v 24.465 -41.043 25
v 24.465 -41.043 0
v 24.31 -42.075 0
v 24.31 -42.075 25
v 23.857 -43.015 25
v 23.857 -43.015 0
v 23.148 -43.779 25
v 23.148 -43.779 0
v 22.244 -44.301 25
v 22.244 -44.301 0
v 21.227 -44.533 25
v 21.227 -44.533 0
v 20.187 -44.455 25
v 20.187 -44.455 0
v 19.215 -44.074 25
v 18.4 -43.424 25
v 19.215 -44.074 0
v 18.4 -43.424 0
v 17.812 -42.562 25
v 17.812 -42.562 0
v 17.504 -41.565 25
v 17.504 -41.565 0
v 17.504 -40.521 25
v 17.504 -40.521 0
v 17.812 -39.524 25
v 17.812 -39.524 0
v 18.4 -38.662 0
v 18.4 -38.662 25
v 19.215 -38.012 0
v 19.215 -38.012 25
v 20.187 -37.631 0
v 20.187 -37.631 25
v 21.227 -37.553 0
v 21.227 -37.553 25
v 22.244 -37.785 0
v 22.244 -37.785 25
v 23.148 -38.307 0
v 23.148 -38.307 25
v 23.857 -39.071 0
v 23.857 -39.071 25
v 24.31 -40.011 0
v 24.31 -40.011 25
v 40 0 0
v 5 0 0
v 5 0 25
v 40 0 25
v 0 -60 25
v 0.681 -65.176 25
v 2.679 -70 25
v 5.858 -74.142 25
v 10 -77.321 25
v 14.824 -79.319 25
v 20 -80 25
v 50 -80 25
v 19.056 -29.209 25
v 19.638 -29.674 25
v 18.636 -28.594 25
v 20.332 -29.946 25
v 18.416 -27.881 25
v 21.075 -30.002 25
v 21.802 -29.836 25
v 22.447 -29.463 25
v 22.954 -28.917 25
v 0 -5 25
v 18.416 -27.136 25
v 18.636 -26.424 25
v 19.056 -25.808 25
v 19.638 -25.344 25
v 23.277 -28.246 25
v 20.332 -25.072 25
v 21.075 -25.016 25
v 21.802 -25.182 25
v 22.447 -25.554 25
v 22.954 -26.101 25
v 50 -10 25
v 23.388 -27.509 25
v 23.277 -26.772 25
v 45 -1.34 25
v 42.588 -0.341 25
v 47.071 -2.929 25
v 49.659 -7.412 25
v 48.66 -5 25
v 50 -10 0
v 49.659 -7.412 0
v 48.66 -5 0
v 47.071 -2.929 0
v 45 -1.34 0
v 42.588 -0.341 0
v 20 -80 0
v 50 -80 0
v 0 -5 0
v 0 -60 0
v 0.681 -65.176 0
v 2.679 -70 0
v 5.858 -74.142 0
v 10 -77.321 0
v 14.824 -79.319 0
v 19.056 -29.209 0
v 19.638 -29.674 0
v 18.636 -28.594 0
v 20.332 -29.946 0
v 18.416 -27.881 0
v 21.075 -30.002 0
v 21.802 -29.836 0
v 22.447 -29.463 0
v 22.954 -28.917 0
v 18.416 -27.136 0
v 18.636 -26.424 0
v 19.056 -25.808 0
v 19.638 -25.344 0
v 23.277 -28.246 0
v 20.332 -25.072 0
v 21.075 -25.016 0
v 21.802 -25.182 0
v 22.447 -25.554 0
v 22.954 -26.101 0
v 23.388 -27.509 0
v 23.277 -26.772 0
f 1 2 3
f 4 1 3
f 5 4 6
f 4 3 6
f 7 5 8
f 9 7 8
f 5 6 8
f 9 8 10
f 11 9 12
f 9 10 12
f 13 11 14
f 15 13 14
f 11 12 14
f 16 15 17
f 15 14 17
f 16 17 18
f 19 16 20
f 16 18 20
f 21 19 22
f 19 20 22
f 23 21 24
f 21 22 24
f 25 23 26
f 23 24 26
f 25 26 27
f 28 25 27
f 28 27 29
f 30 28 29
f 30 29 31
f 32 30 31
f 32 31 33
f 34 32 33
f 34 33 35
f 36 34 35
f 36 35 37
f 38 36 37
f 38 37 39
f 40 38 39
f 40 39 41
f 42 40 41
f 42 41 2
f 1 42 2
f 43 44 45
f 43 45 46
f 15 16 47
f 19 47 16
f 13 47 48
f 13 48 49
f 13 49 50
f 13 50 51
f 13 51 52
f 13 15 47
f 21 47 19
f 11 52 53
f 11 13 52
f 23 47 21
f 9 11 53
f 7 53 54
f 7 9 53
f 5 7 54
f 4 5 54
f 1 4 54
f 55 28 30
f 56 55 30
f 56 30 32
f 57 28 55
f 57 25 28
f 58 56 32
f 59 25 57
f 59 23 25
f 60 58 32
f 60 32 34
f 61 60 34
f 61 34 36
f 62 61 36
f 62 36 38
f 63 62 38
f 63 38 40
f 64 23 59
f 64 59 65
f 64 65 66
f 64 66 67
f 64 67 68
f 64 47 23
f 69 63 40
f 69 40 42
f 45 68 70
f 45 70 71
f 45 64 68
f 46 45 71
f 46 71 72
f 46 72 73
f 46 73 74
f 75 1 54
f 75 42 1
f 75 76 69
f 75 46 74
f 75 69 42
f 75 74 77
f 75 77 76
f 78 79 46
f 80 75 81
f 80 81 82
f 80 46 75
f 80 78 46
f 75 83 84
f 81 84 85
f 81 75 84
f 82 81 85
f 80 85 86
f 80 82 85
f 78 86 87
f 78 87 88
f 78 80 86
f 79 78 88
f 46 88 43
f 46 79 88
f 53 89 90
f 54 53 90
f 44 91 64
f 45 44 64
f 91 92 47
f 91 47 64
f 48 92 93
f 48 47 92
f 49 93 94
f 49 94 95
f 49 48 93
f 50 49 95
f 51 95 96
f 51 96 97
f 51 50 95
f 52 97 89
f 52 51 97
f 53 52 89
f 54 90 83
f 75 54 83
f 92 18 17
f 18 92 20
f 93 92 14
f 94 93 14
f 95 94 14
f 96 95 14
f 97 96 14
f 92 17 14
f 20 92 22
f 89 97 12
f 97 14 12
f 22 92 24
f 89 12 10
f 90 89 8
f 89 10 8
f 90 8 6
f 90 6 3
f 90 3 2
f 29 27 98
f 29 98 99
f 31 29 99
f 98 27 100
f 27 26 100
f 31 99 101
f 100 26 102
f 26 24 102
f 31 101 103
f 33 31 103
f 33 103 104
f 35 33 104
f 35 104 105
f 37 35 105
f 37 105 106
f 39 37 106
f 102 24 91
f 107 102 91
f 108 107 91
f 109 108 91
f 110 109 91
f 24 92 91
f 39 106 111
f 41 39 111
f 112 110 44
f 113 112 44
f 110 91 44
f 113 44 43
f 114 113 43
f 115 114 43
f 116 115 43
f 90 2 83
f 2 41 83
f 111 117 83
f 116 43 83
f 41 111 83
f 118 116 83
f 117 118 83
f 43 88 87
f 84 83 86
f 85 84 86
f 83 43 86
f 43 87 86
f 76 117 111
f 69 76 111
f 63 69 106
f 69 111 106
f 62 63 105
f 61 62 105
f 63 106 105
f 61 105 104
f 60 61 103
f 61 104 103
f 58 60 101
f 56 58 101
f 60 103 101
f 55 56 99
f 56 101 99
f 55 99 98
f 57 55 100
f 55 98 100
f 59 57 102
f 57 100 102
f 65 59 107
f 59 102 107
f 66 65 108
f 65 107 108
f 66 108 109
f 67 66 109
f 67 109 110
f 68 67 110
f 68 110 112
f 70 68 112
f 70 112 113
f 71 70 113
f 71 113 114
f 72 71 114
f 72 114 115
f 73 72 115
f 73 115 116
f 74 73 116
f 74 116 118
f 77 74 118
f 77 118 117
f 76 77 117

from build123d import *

# Parameters (mm, degrees)
F0_W     = 50
F0_H     = 80
F1_DEPTH = 25
F2_R     = 10
F3_SIZE  = 5
F4_R     = 20
F5_R     = 2.5
F5_R_2   = 3.5
F6_DEPTH = 30


with BuildPart() as f1:
    # F0 (on Top) → F1 (new body)
    with BuildSketch(Plane.XY):
        with Locations((25, -40)):
            Rectangle(F0_W, F0_H)
    extrude(amount=F1_DEPTH)

    # F2
    f2_edges = [f1.edges().sort_by_distance(p)[0] for p in [
        (50, 0, 12.5),
    ]]
    fillet(f2_edges, radius=F2_R)

    # F3
    f3_edges = [f1.edges().sort_by_distance(p)[0] for p in [
        (0, 0, 12.5),
    ]]
    chamfer(f3_edges, length=F3_SIZE)

    # F4
    f4_edges = [f1.edges().sort_by_distance(p)[0] for p in [
        (0, -80, 12.5),
    ]]
    fillet(f4_edges, radius=F4_R)

    # F5 (on face) → F6 (cut)
    with BuildSketch(Plane(origin=(0, 0, 0), x_dir=(1, 0, 0), z_dir=(0, 0, -1))):
        with Locations((20.888399, 27.508826)):
            Circle(F5_R)
        with Locations((20.965385, 41.043077)):
            Circle(F5_R_2)
    extrude(amount=-F6_DEPTH, mode=Mode.SUBTRACT)


solid = f1.part
